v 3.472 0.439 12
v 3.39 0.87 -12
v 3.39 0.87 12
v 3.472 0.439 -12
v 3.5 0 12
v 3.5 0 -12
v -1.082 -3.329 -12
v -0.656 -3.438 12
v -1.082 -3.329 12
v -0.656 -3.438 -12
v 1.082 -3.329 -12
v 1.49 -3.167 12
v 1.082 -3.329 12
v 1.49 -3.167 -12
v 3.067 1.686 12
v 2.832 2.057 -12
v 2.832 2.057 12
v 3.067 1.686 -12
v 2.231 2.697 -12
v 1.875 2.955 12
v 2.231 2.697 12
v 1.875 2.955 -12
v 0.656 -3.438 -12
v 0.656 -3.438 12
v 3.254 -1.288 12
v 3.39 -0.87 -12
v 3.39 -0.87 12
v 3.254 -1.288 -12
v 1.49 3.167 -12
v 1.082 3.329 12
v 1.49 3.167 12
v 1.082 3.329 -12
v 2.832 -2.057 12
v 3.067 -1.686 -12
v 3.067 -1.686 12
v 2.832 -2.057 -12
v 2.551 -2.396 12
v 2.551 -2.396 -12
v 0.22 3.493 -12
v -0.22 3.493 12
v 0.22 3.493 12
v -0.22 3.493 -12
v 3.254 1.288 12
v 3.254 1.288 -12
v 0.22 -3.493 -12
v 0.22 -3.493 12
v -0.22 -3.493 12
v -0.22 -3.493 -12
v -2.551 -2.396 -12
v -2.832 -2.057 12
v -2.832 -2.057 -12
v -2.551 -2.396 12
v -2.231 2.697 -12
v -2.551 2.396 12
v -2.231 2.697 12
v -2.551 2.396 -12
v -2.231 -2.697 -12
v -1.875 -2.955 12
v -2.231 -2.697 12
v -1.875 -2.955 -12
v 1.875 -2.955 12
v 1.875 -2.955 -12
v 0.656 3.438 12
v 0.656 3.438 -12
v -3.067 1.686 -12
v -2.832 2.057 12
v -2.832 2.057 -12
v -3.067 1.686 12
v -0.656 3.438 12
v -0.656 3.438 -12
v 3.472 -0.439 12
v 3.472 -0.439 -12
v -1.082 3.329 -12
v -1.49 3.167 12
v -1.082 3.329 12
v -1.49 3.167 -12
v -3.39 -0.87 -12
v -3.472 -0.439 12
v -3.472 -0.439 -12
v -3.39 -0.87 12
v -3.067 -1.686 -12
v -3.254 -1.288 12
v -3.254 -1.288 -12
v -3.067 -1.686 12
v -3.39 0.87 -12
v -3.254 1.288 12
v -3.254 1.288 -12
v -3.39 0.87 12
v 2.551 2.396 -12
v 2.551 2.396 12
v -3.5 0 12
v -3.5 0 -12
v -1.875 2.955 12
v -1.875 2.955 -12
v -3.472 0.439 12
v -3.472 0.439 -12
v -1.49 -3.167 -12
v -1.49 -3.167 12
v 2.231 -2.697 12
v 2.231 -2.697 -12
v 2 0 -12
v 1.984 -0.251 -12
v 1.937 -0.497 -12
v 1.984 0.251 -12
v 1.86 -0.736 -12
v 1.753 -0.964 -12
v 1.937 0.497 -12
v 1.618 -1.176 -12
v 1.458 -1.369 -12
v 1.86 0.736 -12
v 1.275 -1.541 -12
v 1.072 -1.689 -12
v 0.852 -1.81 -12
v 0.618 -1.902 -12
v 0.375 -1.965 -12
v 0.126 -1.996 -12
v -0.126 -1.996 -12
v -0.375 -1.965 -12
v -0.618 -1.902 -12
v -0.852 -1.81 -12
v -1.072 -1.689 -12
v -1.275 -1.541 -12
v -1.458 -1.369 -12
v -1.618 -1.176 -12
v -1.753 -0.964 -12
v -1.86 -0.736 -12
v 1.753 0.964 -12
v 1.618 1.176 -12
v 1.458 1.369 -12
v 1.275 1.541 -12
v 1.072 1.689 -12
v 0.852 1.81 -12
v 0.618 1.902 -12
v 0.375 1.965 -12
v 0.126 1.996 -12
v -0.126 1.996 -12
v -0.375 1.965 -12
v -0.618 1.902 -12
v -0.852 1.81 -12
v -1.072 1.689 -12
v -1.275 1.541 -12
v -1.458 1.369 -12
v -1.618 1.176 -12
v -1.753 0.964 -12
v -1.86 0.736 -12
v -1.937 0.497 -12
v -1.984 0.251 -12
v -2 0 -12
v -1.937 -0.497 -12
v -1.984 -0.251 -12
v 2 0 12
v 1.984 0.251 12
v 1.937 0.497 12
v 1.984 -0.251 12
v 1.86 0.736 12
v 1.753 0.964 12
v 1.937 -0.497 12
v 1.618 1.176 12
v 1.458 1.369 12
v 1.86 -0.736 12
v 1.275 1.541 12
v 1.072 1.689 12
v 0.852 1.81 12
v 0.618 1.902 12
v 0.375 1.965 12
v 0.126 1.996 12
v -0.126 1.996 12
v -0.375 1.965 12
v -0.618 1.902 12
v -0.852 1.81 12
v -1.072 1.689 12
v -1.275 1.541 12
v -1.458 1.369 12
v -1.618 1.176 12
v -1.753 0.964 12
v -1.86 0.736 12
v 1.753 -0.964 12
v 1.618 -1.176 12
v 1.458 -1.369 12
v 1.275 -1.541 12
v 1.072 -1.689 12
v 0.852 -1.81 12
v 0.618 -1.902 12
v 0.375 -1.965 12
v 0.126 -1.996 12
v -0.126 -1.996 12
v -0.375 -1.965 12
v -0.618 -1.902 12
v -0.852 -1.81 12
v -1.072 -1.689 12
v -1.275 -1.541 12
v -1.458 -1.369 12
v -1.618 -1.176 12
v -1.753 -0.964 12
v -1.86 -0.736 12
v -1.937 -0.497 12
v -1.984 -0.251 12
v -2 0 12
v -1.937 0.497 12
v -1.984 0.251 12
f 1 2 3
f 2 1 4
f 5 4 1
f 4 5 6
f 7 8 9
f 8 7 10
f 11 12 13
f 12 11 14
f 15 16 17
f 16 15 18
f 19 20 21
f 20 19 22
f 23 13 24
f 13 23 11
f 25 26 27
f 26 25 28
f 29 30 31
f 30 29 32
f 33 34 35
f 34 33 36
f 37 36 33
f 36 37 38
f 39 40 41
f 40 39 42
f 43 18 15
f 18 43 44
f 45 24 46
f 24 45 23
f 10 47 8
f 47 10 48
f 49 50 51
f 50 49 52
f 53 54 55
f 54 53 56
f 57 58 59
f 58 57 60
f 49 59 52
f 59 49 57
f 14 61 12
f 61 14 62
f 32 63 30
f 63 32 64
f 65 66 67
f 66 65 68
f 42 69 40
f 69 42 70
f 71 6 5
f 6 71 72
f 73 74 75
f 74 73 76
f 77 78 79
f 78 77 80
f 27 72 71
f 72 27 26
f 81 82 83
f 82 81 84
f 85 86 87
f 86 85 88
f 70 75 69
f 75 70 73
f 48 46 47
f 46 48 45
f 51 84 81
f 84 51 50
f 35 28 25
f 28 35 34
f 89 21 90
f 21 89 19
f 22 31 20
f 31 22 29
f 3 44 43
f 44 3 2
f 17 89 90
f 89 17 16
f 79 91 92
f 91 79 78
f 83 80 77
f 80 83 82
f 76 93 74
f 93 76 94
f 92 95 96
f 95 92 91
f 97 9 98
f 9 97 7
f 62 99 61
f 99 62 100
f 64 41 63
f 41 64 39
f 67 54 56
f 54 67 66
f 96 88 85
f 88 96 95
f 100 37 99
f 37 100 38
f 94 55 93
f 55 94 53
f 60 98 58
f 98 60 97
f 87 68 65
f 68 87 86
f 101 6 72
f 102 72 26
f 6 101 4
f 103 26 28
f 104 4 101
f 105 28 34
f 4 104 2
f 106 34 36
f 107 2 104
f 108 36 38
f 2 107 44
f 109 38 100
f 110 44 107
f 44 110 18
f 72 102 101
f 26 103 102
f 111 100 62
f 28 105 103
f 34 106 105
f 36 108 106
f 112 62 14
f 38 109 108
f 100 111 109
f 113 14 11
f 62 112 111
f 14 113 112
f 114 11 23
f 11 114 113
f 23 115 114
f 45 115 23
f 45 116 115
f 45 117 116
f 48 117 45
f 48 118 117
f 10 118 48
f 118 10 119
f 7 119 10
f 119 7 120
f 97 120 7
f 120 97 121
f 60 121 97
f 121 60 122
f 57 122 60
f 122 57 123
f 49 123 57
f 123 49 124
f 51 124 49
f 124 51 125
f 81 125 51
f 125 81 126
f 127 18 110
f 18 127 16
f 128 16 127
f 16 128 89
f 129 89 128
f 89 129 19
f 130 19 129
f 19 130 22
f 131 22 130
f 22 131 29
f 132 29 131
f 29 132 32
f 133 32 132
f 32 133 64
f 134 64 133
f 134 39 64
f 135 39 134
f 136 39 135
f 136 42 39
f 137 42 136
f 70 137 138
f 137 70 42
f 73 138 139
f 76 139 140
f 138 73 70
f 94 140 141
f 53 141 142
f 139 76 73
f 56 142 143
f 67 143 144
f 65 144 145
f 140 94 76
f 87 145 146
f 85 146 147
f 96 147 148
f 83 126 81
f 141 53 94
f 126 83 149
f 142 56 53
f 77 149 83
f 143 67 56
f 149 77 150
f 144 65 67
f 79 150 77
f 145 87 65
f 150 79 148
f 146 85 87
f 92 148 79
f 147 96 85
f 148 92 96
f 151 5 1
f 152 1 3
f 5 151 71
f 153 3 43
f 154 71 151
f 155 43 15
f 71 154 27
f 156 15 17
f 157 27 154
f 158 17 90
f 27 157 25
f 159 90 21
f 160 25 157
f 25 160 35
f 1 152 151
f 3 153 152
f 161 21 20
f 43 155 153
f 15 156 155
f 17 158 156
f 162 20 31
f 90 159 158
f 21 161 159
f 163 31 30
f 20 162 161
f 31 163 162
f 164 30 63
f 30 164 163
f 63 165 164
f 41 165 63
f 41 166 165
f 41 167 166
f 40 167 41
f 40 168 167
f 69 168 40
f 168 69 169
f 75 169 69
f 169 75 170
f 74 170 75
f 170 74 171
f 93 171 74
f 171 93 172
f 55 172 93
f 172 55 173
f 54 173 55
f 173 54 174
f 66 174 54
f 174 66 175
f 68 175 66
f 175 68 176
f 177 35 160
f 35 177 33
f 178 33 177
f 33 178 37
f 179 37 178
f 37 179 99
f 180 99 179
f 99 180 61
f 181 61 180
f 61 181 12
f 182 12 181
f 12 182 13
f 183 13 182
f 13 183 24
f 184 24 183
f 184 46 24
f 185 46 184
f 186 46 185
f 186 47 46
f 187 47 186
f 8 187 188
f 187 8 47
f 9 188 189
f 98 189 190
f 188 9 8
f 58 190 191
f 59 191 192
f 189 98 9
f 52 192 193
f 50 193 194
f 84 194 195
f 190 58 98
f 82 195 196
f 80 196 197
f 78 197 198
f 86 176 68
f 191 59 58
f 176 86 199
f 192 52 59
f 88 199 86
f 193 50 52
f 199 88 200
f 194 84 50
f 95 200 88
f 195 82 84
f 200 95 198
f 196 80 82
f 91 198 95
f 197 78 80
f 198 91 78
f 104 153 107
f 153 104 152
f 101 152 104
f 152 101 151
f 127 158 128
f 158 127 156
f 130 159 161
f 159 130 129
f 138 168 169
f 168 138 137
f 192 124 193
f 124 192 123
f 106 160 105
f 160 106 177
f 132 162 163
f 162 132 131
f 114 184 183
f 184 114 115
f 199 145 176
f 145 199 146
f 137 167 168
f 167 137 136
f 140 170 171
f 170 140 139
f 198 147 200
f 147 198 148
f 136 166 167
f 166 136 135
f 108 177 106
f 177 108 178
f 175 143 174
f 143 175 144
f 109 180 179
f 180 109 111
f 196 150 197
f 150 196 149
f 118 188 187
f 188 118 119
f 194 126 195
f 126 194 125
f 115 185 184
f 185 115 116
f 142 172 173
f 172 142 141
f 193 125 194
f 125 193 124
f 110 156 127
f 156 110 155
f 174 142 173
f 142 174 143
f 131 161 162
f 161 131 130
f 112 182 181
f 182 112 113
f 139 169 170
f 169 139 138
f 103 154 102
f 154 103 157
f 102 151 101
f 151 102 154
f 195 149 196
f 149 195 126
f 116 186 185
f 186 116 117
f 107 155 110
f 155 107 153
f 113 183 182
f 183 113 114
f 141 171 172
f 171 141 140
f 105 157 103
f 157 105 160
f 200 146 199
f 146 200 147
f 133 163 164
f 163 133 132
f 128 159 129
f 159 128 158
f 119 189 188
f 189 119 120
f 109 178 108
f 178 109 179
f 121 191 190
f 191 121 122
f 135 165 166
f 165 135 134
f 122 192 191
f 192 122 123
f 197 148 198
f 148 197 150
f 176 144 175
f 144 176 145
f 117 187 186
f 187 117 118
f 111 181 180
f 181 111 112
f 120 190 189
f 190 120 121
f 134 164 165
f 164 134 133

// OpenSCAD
$fn = 50;


difference() {
	union() {
		translate(v = [0, 0, -12.0000000000]) {
			cylinder(h = 24, r = 3.5000000000);
		}
	}
	union() {
		translate(v = [0, 0, -100.0000000000]) {
			cylinder(h = 200, r = 2.0000000000);
		}
	}
}
